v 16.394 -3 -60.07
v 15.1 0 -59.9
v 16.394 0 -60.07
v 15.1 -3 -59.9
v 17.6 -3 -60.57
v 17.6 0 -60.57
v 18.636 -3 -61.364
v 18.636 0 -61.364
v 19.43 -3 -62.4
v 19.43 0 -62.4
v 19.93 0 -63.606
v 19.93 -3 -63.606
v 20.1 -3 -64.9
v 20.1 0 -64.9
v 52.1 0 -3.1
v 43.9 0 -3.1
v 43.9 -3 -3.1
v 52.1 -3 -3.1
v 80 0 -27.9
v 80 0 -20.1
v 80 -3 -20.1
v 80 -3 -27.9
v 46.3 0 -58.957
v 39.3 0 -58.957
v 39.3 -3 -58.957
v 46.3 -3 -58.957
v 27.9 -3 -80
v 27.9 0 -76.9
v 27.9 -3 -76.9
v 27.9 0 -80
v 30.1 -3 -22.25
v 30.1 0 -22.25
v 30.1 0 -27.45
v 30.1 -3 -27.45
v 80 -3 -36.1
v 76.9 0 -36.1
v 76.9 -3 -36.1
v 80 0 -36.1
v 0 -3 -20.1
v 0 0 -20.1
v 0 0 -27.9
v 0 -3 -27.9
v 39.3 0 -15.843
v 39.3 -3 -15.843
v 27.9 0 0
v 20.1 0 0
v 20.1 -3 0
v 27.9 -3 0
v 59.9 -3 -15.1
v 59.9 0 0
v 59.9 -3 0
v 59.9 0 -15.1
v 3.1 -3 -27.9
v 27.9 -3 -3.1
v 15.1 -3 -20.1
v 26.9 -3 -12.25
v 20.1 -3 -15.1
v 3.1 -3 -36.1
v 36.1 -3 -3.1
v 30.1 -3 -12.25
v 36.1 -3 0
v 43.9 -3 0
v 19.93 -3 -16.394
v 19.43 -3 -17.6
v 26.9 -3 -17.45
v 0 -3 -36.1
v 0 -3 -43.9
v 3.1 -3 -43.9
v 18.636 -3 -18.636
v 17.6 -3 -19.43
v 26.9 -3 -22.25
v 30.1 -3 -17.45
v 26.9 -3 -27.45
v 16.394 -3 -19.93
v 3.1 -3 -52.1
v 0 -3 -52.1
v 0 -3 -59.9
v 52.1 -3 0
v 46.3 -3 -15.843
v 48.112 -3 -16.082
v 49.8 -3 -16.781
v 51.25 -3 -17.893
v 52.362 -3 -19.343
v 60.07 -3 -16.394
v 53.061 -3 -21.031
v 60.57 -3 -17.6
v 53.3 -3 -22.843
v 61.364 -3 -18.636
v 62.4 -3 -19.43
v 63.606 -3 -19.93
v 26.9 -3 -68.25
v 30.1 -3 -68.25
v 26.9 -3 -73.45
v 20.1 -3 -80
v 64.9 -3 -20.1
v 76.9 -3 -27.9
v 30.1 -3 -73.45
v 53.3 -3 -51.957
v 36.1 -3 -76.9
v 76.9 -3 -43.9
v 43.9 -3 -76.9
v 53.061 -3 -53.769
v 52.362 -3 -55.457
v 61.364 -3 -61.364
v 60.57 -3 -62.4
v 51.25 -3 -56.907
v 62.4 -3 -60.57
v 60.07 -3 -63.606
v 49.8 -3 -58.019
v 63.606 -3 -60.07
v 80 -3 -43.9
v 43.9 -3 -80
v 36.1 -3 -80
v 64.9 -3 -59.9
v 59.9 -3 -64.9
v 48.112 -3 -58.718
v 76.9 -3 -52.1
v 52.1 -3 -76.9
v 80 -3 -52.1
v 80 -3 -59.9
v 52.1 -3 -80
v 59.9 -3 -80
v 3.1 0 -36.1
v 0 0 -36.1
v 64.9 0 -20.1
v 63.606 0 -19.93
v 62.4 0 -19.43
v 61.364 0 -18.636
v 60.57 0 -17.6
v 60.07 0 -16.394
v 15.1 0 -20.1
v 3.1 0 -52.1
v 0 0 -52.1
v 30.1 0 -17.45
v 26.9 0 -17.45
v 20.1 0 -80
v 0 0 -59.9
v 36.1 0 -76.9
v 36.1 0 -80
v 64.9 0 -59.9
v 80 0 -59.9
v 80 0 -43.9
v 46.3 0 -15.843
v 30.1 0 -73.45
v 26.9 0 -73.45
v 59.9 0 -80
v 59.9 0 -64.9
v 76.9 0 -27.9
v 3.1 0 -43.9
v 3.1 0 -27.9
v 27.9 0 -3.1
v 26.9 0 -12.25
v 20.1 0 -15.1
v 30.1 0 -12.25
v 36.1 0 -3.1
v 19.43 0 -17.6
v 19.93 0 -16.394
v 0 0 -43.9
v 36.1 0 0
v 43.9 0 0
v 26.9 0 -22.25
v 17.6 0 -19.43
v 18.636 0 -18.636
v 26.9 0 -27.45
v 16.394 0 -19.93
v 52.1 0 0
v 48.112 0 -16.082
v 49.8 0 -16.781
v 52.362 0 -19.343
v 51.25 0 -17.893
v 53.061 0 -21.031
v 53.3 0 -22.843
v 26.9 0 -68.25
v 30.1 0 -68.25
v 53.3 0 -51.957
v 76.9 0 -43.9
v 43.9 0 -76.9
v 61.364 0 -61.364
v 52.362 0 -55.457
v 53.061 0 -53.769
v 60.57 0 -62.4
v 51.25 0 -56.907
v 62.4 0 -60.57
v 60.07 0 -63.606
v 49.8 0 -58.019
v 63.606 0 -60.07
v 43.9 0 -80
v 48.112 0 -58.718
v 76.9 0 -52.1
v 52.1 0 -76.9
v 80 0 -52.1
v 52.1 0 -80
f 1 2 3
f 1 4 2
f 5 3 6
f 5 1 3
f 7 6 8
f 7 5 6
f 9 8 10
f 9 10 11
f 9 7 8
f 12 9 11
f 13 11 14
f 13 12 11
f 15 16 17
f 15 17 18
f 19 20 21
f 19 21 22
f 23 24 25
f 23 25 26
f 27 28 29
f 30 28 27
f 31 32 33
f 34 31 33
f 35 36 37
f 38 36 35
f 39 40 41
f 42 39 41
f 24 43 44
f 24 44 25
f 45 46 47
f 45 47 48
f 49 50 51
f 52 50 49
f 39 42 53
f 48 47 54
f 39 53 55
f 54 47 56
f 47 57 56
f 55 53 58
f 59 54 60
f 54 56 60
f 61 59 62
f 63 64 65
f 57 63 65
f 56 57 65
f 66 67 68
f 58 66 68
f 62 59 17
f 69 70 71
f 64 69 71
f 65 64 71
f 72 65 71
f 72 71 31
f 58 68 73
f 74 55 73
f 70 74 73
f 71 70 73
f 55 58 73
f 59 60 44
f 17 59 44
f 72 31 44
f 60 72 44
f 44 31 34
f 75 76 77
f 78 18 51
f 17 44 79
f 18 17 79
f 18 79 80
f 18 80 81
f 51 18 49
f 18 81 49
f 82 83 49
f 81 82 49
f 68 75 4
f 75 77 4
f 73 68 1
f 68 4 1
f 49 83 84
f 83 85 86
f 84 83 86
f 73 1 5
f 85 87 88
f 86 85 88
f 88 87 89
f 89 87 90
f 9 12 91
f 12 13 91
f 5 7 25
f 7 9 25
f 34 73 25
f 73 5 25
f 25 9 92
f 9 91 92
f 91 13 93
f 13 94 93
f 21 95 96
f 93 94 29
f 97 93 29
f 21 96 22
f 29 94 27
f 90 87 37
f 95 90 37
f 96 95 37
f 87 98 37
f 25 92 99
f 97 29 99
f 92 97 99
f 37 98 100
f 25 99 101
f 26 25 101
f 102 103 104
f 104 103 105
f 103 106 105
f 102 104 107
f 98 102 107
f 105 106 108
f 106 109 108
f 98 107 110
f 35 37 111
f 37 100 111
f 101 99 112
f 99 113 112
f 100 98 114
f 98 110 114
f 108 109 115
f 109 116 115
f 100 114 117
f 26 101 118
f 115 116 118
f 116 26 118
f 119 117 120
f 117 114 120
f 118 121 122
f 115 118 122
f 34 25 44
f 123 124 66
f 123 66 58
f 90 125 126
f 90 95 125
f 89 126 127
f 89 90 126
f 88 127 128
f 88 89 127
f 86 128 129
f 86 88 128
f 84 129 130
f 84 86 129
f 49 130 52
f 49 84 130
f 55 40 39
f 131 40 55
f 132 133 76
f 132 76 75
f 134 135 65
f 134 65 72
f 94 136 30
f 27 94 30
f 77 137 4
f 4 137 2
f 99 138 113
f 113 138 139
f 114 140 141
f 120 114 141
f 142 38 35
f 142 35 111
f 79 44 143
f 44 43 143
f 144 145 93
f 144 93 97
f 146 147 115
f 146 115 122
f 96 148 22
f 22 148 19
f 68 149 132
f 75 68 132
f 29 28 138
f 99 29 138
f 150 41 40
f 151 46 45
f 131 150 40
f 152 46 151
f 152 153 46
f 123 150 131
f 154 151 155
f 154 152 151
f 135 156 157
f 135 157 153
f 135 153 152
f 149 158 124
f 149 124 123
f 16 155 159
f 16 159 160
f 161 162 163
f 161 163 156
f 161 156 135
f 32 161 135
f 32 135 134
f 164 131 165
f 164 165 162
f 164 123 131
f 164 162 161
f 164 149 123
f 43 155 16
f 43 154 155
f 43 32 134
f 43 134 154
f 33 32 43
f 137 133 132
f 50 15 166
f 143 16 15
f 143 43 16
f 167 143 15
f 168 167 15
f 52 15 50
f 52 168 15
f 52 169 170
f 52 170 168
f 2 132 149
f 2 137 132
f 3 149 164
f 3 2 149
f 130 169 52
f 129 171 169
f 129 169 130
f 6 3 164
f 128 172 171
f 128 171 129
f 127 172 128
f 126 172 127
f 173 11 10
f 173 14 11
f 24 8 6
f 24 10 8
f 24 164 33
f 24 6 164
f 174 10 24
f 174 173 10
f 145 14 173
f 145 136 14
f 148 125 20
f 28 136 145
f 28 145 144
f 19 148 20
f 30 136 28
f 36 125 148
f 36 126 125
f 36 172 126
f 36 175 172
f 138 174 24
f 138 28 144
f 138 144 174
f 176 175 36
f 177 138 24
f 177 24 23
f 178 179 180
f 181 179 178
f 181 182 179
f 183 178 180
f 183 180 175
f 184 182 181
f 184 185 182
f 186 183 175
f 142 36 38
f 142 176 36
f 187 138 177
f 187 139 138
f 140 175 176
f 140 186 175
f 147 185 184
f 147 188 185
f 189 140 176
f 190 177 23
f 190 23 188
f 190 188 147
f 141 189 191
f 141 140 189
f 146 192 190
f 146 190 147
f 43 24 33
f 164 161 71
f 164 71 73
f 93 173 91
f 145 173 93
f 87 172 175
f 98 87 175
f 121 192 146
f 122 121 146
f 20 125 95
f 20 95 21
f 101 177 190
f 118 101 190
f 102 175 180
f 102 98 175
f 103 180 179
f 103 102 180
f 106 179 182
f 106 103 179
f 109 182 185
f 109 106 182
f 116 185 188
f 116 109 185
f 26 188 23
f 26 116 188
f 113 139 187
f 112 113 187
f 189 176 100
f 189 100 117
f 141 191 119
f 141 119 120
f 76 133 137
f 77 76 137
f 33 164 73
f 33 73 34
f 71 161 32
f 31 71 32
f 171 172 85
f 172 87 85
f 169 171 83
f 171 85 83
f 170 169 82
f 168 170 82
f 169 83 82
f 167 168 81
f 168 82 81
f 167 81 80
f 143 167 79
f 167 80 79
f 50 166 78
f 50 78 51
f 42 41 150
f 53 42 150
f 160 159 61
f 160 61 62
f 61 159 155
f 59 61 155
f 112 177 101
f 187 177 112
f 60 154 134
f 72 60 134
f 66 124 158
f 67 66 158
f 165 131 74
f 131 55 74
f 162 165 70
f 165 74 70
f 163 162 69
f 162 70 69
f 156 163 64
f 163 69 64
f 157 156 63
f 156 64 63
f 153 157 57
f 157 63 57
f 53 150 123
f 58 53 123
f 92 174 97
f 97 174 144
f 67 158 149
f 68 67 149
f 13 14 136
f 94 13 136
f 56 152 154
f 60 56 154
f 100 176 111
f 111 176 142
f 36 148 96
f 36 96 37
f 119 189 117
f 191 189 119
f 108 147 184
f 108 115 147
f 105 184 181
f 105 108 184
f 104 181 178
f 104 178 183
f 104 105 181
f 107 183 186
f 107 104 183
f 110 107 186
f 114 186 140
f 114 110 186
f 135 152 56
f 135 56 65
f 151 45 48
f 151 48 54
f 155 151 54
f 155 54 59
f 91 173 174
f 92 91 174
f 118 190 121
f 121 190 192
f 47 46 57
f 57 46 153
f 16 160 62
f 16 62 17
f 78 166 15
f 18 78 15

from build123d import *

# Parameters (mm, degrees)
SKETCH1_W           = 80
SKETCH1_H           = 80
SKETCH1_W_2         = 9
SKETCH1_H_2         = 43.113686922
BOSS_EXTRUDE1_DEPTH = 3
SKETCH3_W           = 8.2
SKETCH3_H           = 3.2
SKETCH3_W_2         = 3.2
SKETCH3_H_2         = 8.2
SKETCH3_W_3         = 20.2
SKETCH3_H_3         = 20.2
SKETCH3_H_4         = 5.2
CUT_EXTRUDE1_DEPTH  = 4
FILLET1_R           = 5
SKETCH4_W           = 5
SKETCH4_H           = 43.113686922
CUT_EXTRUDE2_DEPTH  = 4
FILLET2_R           = 7


with BuildPart() as part:
    # Sketch1 → Boss-Extrude1 (new body)
    with BuildSketch(Plane(origin=(0, 0, 0), x_dir=(1, 0, 0), z_dir=(0, 1, 0))):
        with Locations((40, 40)):
            Rectangle(SKETCH1_W, SKETCH1_H)
        with Locations((43.8, 37.4)):
            Rectangle(SKETCH1_W_2, SKETCH1_H_2, mode=Mode.SUBTRACT)
    extrude(amount=-BOSS_EXTRUDE1_DEPTH)

    # Sketch3 → Cut-Extrude1 (cut, through all)
    with BuildSketch(Plane(origin=(0, 0, 0), x_dir=(1, 0, 0), z_dir=(0, 1, 0))):
        with Locations((32, 1.5)):
            Rectangle(SKETCH3_W, SKETCH3_H)
        with Locations((78.5, 32)):
            Rectangle(SKETCH3_W_2, SKETCH3_H_2)
        with Locations((48, 1.5)):
            Rectangle(SKETCH3_W, SKETCH3_H)
        with Locations((1.5, 32)):
            Rectangle(SKETCH3_W_2, SKETCH3_H_2)
        with Locations((10, 10)):
            Rectangle(SKETCH3_W_3, SKETCH3_H_3)
        with Locations((70, 10)):
            Rectangle(SKETCH3_W_3, SKETCH3_H_3)
        with Locations((32, 78.5)):
            Rectangle(SKETCH3_W, SKETCH3_H)
        with Locations((1.5, 48)):
            Rectangle(SKETCH3_W_2, SKETCH3_H_2)
        with Locations((10, 70)):
            Rectangle(SKETCH3_W_3, SKETCH3_H_3)
        with Locations((78.5, 48)):
            Rectangle(SKETCH3_W_2, SKETCH3_H_2)
        with Locations((70, 70)):
            Rectangle(SKETCH3_W_3, SKETCH3_H_3)
        with Locations((48, 78.5)):
            Rectangle(SKETCH3_W, SKETCH3_H)
        with Locations((28.5, 14.85)):
            Rectangle(SKETCH3_W_2, SKETCH3_H_4)
        with Locations((28.5, 24.85)):
            Rectangle(SKETCH3_W_2, SKETCH3_H_4)
        with Locations((28.5, 70.85)):
            Rectangle(SKETCH3_W_2, SKETCH3_H_4)
    extrude(amount=-CUT_EXTRUDE1_DEPTH, mode=Mode.SUBTRACT)

    # Fillet1
    fillet1_edges = [part.edges().sort_by_distance(p)[0] for p in [
        (20.1, -1.5, -20.1),
        (59.9, -1.5, -20.1),
        (20.1, -1.5, -59.9),
        (59.9, -1.5, -59.9),
    ]]
    fillet(fillet1_edges, radius=FILLET1_R)

    # Sketch4 → Cut-Extrude2 (cut, through all)
    with BuildSketch(Plane(origin=(0, 0, 0), x_dir=(1, 0, 0), z_dir=(0, 1, 0))):
        with Locations((50.8, 37.4)):
            Rectangle(SKETCH4_W, SKETCH4_H)
    extrude(amount=-CUT_EXTRUDE2_DEPTH, mode=Mode.SUBTRACT)

    # Fillet2
    fillet2_edges = [part.edges().sort_by_distance(p)[0] for p in [
        (53.3, -1.5, -58.956843461),
        (53.3, -1.5, -15.843156539),
    ]]
    fillet(fillet2_edges, radius=FILLET2_R)


solid = part.part
